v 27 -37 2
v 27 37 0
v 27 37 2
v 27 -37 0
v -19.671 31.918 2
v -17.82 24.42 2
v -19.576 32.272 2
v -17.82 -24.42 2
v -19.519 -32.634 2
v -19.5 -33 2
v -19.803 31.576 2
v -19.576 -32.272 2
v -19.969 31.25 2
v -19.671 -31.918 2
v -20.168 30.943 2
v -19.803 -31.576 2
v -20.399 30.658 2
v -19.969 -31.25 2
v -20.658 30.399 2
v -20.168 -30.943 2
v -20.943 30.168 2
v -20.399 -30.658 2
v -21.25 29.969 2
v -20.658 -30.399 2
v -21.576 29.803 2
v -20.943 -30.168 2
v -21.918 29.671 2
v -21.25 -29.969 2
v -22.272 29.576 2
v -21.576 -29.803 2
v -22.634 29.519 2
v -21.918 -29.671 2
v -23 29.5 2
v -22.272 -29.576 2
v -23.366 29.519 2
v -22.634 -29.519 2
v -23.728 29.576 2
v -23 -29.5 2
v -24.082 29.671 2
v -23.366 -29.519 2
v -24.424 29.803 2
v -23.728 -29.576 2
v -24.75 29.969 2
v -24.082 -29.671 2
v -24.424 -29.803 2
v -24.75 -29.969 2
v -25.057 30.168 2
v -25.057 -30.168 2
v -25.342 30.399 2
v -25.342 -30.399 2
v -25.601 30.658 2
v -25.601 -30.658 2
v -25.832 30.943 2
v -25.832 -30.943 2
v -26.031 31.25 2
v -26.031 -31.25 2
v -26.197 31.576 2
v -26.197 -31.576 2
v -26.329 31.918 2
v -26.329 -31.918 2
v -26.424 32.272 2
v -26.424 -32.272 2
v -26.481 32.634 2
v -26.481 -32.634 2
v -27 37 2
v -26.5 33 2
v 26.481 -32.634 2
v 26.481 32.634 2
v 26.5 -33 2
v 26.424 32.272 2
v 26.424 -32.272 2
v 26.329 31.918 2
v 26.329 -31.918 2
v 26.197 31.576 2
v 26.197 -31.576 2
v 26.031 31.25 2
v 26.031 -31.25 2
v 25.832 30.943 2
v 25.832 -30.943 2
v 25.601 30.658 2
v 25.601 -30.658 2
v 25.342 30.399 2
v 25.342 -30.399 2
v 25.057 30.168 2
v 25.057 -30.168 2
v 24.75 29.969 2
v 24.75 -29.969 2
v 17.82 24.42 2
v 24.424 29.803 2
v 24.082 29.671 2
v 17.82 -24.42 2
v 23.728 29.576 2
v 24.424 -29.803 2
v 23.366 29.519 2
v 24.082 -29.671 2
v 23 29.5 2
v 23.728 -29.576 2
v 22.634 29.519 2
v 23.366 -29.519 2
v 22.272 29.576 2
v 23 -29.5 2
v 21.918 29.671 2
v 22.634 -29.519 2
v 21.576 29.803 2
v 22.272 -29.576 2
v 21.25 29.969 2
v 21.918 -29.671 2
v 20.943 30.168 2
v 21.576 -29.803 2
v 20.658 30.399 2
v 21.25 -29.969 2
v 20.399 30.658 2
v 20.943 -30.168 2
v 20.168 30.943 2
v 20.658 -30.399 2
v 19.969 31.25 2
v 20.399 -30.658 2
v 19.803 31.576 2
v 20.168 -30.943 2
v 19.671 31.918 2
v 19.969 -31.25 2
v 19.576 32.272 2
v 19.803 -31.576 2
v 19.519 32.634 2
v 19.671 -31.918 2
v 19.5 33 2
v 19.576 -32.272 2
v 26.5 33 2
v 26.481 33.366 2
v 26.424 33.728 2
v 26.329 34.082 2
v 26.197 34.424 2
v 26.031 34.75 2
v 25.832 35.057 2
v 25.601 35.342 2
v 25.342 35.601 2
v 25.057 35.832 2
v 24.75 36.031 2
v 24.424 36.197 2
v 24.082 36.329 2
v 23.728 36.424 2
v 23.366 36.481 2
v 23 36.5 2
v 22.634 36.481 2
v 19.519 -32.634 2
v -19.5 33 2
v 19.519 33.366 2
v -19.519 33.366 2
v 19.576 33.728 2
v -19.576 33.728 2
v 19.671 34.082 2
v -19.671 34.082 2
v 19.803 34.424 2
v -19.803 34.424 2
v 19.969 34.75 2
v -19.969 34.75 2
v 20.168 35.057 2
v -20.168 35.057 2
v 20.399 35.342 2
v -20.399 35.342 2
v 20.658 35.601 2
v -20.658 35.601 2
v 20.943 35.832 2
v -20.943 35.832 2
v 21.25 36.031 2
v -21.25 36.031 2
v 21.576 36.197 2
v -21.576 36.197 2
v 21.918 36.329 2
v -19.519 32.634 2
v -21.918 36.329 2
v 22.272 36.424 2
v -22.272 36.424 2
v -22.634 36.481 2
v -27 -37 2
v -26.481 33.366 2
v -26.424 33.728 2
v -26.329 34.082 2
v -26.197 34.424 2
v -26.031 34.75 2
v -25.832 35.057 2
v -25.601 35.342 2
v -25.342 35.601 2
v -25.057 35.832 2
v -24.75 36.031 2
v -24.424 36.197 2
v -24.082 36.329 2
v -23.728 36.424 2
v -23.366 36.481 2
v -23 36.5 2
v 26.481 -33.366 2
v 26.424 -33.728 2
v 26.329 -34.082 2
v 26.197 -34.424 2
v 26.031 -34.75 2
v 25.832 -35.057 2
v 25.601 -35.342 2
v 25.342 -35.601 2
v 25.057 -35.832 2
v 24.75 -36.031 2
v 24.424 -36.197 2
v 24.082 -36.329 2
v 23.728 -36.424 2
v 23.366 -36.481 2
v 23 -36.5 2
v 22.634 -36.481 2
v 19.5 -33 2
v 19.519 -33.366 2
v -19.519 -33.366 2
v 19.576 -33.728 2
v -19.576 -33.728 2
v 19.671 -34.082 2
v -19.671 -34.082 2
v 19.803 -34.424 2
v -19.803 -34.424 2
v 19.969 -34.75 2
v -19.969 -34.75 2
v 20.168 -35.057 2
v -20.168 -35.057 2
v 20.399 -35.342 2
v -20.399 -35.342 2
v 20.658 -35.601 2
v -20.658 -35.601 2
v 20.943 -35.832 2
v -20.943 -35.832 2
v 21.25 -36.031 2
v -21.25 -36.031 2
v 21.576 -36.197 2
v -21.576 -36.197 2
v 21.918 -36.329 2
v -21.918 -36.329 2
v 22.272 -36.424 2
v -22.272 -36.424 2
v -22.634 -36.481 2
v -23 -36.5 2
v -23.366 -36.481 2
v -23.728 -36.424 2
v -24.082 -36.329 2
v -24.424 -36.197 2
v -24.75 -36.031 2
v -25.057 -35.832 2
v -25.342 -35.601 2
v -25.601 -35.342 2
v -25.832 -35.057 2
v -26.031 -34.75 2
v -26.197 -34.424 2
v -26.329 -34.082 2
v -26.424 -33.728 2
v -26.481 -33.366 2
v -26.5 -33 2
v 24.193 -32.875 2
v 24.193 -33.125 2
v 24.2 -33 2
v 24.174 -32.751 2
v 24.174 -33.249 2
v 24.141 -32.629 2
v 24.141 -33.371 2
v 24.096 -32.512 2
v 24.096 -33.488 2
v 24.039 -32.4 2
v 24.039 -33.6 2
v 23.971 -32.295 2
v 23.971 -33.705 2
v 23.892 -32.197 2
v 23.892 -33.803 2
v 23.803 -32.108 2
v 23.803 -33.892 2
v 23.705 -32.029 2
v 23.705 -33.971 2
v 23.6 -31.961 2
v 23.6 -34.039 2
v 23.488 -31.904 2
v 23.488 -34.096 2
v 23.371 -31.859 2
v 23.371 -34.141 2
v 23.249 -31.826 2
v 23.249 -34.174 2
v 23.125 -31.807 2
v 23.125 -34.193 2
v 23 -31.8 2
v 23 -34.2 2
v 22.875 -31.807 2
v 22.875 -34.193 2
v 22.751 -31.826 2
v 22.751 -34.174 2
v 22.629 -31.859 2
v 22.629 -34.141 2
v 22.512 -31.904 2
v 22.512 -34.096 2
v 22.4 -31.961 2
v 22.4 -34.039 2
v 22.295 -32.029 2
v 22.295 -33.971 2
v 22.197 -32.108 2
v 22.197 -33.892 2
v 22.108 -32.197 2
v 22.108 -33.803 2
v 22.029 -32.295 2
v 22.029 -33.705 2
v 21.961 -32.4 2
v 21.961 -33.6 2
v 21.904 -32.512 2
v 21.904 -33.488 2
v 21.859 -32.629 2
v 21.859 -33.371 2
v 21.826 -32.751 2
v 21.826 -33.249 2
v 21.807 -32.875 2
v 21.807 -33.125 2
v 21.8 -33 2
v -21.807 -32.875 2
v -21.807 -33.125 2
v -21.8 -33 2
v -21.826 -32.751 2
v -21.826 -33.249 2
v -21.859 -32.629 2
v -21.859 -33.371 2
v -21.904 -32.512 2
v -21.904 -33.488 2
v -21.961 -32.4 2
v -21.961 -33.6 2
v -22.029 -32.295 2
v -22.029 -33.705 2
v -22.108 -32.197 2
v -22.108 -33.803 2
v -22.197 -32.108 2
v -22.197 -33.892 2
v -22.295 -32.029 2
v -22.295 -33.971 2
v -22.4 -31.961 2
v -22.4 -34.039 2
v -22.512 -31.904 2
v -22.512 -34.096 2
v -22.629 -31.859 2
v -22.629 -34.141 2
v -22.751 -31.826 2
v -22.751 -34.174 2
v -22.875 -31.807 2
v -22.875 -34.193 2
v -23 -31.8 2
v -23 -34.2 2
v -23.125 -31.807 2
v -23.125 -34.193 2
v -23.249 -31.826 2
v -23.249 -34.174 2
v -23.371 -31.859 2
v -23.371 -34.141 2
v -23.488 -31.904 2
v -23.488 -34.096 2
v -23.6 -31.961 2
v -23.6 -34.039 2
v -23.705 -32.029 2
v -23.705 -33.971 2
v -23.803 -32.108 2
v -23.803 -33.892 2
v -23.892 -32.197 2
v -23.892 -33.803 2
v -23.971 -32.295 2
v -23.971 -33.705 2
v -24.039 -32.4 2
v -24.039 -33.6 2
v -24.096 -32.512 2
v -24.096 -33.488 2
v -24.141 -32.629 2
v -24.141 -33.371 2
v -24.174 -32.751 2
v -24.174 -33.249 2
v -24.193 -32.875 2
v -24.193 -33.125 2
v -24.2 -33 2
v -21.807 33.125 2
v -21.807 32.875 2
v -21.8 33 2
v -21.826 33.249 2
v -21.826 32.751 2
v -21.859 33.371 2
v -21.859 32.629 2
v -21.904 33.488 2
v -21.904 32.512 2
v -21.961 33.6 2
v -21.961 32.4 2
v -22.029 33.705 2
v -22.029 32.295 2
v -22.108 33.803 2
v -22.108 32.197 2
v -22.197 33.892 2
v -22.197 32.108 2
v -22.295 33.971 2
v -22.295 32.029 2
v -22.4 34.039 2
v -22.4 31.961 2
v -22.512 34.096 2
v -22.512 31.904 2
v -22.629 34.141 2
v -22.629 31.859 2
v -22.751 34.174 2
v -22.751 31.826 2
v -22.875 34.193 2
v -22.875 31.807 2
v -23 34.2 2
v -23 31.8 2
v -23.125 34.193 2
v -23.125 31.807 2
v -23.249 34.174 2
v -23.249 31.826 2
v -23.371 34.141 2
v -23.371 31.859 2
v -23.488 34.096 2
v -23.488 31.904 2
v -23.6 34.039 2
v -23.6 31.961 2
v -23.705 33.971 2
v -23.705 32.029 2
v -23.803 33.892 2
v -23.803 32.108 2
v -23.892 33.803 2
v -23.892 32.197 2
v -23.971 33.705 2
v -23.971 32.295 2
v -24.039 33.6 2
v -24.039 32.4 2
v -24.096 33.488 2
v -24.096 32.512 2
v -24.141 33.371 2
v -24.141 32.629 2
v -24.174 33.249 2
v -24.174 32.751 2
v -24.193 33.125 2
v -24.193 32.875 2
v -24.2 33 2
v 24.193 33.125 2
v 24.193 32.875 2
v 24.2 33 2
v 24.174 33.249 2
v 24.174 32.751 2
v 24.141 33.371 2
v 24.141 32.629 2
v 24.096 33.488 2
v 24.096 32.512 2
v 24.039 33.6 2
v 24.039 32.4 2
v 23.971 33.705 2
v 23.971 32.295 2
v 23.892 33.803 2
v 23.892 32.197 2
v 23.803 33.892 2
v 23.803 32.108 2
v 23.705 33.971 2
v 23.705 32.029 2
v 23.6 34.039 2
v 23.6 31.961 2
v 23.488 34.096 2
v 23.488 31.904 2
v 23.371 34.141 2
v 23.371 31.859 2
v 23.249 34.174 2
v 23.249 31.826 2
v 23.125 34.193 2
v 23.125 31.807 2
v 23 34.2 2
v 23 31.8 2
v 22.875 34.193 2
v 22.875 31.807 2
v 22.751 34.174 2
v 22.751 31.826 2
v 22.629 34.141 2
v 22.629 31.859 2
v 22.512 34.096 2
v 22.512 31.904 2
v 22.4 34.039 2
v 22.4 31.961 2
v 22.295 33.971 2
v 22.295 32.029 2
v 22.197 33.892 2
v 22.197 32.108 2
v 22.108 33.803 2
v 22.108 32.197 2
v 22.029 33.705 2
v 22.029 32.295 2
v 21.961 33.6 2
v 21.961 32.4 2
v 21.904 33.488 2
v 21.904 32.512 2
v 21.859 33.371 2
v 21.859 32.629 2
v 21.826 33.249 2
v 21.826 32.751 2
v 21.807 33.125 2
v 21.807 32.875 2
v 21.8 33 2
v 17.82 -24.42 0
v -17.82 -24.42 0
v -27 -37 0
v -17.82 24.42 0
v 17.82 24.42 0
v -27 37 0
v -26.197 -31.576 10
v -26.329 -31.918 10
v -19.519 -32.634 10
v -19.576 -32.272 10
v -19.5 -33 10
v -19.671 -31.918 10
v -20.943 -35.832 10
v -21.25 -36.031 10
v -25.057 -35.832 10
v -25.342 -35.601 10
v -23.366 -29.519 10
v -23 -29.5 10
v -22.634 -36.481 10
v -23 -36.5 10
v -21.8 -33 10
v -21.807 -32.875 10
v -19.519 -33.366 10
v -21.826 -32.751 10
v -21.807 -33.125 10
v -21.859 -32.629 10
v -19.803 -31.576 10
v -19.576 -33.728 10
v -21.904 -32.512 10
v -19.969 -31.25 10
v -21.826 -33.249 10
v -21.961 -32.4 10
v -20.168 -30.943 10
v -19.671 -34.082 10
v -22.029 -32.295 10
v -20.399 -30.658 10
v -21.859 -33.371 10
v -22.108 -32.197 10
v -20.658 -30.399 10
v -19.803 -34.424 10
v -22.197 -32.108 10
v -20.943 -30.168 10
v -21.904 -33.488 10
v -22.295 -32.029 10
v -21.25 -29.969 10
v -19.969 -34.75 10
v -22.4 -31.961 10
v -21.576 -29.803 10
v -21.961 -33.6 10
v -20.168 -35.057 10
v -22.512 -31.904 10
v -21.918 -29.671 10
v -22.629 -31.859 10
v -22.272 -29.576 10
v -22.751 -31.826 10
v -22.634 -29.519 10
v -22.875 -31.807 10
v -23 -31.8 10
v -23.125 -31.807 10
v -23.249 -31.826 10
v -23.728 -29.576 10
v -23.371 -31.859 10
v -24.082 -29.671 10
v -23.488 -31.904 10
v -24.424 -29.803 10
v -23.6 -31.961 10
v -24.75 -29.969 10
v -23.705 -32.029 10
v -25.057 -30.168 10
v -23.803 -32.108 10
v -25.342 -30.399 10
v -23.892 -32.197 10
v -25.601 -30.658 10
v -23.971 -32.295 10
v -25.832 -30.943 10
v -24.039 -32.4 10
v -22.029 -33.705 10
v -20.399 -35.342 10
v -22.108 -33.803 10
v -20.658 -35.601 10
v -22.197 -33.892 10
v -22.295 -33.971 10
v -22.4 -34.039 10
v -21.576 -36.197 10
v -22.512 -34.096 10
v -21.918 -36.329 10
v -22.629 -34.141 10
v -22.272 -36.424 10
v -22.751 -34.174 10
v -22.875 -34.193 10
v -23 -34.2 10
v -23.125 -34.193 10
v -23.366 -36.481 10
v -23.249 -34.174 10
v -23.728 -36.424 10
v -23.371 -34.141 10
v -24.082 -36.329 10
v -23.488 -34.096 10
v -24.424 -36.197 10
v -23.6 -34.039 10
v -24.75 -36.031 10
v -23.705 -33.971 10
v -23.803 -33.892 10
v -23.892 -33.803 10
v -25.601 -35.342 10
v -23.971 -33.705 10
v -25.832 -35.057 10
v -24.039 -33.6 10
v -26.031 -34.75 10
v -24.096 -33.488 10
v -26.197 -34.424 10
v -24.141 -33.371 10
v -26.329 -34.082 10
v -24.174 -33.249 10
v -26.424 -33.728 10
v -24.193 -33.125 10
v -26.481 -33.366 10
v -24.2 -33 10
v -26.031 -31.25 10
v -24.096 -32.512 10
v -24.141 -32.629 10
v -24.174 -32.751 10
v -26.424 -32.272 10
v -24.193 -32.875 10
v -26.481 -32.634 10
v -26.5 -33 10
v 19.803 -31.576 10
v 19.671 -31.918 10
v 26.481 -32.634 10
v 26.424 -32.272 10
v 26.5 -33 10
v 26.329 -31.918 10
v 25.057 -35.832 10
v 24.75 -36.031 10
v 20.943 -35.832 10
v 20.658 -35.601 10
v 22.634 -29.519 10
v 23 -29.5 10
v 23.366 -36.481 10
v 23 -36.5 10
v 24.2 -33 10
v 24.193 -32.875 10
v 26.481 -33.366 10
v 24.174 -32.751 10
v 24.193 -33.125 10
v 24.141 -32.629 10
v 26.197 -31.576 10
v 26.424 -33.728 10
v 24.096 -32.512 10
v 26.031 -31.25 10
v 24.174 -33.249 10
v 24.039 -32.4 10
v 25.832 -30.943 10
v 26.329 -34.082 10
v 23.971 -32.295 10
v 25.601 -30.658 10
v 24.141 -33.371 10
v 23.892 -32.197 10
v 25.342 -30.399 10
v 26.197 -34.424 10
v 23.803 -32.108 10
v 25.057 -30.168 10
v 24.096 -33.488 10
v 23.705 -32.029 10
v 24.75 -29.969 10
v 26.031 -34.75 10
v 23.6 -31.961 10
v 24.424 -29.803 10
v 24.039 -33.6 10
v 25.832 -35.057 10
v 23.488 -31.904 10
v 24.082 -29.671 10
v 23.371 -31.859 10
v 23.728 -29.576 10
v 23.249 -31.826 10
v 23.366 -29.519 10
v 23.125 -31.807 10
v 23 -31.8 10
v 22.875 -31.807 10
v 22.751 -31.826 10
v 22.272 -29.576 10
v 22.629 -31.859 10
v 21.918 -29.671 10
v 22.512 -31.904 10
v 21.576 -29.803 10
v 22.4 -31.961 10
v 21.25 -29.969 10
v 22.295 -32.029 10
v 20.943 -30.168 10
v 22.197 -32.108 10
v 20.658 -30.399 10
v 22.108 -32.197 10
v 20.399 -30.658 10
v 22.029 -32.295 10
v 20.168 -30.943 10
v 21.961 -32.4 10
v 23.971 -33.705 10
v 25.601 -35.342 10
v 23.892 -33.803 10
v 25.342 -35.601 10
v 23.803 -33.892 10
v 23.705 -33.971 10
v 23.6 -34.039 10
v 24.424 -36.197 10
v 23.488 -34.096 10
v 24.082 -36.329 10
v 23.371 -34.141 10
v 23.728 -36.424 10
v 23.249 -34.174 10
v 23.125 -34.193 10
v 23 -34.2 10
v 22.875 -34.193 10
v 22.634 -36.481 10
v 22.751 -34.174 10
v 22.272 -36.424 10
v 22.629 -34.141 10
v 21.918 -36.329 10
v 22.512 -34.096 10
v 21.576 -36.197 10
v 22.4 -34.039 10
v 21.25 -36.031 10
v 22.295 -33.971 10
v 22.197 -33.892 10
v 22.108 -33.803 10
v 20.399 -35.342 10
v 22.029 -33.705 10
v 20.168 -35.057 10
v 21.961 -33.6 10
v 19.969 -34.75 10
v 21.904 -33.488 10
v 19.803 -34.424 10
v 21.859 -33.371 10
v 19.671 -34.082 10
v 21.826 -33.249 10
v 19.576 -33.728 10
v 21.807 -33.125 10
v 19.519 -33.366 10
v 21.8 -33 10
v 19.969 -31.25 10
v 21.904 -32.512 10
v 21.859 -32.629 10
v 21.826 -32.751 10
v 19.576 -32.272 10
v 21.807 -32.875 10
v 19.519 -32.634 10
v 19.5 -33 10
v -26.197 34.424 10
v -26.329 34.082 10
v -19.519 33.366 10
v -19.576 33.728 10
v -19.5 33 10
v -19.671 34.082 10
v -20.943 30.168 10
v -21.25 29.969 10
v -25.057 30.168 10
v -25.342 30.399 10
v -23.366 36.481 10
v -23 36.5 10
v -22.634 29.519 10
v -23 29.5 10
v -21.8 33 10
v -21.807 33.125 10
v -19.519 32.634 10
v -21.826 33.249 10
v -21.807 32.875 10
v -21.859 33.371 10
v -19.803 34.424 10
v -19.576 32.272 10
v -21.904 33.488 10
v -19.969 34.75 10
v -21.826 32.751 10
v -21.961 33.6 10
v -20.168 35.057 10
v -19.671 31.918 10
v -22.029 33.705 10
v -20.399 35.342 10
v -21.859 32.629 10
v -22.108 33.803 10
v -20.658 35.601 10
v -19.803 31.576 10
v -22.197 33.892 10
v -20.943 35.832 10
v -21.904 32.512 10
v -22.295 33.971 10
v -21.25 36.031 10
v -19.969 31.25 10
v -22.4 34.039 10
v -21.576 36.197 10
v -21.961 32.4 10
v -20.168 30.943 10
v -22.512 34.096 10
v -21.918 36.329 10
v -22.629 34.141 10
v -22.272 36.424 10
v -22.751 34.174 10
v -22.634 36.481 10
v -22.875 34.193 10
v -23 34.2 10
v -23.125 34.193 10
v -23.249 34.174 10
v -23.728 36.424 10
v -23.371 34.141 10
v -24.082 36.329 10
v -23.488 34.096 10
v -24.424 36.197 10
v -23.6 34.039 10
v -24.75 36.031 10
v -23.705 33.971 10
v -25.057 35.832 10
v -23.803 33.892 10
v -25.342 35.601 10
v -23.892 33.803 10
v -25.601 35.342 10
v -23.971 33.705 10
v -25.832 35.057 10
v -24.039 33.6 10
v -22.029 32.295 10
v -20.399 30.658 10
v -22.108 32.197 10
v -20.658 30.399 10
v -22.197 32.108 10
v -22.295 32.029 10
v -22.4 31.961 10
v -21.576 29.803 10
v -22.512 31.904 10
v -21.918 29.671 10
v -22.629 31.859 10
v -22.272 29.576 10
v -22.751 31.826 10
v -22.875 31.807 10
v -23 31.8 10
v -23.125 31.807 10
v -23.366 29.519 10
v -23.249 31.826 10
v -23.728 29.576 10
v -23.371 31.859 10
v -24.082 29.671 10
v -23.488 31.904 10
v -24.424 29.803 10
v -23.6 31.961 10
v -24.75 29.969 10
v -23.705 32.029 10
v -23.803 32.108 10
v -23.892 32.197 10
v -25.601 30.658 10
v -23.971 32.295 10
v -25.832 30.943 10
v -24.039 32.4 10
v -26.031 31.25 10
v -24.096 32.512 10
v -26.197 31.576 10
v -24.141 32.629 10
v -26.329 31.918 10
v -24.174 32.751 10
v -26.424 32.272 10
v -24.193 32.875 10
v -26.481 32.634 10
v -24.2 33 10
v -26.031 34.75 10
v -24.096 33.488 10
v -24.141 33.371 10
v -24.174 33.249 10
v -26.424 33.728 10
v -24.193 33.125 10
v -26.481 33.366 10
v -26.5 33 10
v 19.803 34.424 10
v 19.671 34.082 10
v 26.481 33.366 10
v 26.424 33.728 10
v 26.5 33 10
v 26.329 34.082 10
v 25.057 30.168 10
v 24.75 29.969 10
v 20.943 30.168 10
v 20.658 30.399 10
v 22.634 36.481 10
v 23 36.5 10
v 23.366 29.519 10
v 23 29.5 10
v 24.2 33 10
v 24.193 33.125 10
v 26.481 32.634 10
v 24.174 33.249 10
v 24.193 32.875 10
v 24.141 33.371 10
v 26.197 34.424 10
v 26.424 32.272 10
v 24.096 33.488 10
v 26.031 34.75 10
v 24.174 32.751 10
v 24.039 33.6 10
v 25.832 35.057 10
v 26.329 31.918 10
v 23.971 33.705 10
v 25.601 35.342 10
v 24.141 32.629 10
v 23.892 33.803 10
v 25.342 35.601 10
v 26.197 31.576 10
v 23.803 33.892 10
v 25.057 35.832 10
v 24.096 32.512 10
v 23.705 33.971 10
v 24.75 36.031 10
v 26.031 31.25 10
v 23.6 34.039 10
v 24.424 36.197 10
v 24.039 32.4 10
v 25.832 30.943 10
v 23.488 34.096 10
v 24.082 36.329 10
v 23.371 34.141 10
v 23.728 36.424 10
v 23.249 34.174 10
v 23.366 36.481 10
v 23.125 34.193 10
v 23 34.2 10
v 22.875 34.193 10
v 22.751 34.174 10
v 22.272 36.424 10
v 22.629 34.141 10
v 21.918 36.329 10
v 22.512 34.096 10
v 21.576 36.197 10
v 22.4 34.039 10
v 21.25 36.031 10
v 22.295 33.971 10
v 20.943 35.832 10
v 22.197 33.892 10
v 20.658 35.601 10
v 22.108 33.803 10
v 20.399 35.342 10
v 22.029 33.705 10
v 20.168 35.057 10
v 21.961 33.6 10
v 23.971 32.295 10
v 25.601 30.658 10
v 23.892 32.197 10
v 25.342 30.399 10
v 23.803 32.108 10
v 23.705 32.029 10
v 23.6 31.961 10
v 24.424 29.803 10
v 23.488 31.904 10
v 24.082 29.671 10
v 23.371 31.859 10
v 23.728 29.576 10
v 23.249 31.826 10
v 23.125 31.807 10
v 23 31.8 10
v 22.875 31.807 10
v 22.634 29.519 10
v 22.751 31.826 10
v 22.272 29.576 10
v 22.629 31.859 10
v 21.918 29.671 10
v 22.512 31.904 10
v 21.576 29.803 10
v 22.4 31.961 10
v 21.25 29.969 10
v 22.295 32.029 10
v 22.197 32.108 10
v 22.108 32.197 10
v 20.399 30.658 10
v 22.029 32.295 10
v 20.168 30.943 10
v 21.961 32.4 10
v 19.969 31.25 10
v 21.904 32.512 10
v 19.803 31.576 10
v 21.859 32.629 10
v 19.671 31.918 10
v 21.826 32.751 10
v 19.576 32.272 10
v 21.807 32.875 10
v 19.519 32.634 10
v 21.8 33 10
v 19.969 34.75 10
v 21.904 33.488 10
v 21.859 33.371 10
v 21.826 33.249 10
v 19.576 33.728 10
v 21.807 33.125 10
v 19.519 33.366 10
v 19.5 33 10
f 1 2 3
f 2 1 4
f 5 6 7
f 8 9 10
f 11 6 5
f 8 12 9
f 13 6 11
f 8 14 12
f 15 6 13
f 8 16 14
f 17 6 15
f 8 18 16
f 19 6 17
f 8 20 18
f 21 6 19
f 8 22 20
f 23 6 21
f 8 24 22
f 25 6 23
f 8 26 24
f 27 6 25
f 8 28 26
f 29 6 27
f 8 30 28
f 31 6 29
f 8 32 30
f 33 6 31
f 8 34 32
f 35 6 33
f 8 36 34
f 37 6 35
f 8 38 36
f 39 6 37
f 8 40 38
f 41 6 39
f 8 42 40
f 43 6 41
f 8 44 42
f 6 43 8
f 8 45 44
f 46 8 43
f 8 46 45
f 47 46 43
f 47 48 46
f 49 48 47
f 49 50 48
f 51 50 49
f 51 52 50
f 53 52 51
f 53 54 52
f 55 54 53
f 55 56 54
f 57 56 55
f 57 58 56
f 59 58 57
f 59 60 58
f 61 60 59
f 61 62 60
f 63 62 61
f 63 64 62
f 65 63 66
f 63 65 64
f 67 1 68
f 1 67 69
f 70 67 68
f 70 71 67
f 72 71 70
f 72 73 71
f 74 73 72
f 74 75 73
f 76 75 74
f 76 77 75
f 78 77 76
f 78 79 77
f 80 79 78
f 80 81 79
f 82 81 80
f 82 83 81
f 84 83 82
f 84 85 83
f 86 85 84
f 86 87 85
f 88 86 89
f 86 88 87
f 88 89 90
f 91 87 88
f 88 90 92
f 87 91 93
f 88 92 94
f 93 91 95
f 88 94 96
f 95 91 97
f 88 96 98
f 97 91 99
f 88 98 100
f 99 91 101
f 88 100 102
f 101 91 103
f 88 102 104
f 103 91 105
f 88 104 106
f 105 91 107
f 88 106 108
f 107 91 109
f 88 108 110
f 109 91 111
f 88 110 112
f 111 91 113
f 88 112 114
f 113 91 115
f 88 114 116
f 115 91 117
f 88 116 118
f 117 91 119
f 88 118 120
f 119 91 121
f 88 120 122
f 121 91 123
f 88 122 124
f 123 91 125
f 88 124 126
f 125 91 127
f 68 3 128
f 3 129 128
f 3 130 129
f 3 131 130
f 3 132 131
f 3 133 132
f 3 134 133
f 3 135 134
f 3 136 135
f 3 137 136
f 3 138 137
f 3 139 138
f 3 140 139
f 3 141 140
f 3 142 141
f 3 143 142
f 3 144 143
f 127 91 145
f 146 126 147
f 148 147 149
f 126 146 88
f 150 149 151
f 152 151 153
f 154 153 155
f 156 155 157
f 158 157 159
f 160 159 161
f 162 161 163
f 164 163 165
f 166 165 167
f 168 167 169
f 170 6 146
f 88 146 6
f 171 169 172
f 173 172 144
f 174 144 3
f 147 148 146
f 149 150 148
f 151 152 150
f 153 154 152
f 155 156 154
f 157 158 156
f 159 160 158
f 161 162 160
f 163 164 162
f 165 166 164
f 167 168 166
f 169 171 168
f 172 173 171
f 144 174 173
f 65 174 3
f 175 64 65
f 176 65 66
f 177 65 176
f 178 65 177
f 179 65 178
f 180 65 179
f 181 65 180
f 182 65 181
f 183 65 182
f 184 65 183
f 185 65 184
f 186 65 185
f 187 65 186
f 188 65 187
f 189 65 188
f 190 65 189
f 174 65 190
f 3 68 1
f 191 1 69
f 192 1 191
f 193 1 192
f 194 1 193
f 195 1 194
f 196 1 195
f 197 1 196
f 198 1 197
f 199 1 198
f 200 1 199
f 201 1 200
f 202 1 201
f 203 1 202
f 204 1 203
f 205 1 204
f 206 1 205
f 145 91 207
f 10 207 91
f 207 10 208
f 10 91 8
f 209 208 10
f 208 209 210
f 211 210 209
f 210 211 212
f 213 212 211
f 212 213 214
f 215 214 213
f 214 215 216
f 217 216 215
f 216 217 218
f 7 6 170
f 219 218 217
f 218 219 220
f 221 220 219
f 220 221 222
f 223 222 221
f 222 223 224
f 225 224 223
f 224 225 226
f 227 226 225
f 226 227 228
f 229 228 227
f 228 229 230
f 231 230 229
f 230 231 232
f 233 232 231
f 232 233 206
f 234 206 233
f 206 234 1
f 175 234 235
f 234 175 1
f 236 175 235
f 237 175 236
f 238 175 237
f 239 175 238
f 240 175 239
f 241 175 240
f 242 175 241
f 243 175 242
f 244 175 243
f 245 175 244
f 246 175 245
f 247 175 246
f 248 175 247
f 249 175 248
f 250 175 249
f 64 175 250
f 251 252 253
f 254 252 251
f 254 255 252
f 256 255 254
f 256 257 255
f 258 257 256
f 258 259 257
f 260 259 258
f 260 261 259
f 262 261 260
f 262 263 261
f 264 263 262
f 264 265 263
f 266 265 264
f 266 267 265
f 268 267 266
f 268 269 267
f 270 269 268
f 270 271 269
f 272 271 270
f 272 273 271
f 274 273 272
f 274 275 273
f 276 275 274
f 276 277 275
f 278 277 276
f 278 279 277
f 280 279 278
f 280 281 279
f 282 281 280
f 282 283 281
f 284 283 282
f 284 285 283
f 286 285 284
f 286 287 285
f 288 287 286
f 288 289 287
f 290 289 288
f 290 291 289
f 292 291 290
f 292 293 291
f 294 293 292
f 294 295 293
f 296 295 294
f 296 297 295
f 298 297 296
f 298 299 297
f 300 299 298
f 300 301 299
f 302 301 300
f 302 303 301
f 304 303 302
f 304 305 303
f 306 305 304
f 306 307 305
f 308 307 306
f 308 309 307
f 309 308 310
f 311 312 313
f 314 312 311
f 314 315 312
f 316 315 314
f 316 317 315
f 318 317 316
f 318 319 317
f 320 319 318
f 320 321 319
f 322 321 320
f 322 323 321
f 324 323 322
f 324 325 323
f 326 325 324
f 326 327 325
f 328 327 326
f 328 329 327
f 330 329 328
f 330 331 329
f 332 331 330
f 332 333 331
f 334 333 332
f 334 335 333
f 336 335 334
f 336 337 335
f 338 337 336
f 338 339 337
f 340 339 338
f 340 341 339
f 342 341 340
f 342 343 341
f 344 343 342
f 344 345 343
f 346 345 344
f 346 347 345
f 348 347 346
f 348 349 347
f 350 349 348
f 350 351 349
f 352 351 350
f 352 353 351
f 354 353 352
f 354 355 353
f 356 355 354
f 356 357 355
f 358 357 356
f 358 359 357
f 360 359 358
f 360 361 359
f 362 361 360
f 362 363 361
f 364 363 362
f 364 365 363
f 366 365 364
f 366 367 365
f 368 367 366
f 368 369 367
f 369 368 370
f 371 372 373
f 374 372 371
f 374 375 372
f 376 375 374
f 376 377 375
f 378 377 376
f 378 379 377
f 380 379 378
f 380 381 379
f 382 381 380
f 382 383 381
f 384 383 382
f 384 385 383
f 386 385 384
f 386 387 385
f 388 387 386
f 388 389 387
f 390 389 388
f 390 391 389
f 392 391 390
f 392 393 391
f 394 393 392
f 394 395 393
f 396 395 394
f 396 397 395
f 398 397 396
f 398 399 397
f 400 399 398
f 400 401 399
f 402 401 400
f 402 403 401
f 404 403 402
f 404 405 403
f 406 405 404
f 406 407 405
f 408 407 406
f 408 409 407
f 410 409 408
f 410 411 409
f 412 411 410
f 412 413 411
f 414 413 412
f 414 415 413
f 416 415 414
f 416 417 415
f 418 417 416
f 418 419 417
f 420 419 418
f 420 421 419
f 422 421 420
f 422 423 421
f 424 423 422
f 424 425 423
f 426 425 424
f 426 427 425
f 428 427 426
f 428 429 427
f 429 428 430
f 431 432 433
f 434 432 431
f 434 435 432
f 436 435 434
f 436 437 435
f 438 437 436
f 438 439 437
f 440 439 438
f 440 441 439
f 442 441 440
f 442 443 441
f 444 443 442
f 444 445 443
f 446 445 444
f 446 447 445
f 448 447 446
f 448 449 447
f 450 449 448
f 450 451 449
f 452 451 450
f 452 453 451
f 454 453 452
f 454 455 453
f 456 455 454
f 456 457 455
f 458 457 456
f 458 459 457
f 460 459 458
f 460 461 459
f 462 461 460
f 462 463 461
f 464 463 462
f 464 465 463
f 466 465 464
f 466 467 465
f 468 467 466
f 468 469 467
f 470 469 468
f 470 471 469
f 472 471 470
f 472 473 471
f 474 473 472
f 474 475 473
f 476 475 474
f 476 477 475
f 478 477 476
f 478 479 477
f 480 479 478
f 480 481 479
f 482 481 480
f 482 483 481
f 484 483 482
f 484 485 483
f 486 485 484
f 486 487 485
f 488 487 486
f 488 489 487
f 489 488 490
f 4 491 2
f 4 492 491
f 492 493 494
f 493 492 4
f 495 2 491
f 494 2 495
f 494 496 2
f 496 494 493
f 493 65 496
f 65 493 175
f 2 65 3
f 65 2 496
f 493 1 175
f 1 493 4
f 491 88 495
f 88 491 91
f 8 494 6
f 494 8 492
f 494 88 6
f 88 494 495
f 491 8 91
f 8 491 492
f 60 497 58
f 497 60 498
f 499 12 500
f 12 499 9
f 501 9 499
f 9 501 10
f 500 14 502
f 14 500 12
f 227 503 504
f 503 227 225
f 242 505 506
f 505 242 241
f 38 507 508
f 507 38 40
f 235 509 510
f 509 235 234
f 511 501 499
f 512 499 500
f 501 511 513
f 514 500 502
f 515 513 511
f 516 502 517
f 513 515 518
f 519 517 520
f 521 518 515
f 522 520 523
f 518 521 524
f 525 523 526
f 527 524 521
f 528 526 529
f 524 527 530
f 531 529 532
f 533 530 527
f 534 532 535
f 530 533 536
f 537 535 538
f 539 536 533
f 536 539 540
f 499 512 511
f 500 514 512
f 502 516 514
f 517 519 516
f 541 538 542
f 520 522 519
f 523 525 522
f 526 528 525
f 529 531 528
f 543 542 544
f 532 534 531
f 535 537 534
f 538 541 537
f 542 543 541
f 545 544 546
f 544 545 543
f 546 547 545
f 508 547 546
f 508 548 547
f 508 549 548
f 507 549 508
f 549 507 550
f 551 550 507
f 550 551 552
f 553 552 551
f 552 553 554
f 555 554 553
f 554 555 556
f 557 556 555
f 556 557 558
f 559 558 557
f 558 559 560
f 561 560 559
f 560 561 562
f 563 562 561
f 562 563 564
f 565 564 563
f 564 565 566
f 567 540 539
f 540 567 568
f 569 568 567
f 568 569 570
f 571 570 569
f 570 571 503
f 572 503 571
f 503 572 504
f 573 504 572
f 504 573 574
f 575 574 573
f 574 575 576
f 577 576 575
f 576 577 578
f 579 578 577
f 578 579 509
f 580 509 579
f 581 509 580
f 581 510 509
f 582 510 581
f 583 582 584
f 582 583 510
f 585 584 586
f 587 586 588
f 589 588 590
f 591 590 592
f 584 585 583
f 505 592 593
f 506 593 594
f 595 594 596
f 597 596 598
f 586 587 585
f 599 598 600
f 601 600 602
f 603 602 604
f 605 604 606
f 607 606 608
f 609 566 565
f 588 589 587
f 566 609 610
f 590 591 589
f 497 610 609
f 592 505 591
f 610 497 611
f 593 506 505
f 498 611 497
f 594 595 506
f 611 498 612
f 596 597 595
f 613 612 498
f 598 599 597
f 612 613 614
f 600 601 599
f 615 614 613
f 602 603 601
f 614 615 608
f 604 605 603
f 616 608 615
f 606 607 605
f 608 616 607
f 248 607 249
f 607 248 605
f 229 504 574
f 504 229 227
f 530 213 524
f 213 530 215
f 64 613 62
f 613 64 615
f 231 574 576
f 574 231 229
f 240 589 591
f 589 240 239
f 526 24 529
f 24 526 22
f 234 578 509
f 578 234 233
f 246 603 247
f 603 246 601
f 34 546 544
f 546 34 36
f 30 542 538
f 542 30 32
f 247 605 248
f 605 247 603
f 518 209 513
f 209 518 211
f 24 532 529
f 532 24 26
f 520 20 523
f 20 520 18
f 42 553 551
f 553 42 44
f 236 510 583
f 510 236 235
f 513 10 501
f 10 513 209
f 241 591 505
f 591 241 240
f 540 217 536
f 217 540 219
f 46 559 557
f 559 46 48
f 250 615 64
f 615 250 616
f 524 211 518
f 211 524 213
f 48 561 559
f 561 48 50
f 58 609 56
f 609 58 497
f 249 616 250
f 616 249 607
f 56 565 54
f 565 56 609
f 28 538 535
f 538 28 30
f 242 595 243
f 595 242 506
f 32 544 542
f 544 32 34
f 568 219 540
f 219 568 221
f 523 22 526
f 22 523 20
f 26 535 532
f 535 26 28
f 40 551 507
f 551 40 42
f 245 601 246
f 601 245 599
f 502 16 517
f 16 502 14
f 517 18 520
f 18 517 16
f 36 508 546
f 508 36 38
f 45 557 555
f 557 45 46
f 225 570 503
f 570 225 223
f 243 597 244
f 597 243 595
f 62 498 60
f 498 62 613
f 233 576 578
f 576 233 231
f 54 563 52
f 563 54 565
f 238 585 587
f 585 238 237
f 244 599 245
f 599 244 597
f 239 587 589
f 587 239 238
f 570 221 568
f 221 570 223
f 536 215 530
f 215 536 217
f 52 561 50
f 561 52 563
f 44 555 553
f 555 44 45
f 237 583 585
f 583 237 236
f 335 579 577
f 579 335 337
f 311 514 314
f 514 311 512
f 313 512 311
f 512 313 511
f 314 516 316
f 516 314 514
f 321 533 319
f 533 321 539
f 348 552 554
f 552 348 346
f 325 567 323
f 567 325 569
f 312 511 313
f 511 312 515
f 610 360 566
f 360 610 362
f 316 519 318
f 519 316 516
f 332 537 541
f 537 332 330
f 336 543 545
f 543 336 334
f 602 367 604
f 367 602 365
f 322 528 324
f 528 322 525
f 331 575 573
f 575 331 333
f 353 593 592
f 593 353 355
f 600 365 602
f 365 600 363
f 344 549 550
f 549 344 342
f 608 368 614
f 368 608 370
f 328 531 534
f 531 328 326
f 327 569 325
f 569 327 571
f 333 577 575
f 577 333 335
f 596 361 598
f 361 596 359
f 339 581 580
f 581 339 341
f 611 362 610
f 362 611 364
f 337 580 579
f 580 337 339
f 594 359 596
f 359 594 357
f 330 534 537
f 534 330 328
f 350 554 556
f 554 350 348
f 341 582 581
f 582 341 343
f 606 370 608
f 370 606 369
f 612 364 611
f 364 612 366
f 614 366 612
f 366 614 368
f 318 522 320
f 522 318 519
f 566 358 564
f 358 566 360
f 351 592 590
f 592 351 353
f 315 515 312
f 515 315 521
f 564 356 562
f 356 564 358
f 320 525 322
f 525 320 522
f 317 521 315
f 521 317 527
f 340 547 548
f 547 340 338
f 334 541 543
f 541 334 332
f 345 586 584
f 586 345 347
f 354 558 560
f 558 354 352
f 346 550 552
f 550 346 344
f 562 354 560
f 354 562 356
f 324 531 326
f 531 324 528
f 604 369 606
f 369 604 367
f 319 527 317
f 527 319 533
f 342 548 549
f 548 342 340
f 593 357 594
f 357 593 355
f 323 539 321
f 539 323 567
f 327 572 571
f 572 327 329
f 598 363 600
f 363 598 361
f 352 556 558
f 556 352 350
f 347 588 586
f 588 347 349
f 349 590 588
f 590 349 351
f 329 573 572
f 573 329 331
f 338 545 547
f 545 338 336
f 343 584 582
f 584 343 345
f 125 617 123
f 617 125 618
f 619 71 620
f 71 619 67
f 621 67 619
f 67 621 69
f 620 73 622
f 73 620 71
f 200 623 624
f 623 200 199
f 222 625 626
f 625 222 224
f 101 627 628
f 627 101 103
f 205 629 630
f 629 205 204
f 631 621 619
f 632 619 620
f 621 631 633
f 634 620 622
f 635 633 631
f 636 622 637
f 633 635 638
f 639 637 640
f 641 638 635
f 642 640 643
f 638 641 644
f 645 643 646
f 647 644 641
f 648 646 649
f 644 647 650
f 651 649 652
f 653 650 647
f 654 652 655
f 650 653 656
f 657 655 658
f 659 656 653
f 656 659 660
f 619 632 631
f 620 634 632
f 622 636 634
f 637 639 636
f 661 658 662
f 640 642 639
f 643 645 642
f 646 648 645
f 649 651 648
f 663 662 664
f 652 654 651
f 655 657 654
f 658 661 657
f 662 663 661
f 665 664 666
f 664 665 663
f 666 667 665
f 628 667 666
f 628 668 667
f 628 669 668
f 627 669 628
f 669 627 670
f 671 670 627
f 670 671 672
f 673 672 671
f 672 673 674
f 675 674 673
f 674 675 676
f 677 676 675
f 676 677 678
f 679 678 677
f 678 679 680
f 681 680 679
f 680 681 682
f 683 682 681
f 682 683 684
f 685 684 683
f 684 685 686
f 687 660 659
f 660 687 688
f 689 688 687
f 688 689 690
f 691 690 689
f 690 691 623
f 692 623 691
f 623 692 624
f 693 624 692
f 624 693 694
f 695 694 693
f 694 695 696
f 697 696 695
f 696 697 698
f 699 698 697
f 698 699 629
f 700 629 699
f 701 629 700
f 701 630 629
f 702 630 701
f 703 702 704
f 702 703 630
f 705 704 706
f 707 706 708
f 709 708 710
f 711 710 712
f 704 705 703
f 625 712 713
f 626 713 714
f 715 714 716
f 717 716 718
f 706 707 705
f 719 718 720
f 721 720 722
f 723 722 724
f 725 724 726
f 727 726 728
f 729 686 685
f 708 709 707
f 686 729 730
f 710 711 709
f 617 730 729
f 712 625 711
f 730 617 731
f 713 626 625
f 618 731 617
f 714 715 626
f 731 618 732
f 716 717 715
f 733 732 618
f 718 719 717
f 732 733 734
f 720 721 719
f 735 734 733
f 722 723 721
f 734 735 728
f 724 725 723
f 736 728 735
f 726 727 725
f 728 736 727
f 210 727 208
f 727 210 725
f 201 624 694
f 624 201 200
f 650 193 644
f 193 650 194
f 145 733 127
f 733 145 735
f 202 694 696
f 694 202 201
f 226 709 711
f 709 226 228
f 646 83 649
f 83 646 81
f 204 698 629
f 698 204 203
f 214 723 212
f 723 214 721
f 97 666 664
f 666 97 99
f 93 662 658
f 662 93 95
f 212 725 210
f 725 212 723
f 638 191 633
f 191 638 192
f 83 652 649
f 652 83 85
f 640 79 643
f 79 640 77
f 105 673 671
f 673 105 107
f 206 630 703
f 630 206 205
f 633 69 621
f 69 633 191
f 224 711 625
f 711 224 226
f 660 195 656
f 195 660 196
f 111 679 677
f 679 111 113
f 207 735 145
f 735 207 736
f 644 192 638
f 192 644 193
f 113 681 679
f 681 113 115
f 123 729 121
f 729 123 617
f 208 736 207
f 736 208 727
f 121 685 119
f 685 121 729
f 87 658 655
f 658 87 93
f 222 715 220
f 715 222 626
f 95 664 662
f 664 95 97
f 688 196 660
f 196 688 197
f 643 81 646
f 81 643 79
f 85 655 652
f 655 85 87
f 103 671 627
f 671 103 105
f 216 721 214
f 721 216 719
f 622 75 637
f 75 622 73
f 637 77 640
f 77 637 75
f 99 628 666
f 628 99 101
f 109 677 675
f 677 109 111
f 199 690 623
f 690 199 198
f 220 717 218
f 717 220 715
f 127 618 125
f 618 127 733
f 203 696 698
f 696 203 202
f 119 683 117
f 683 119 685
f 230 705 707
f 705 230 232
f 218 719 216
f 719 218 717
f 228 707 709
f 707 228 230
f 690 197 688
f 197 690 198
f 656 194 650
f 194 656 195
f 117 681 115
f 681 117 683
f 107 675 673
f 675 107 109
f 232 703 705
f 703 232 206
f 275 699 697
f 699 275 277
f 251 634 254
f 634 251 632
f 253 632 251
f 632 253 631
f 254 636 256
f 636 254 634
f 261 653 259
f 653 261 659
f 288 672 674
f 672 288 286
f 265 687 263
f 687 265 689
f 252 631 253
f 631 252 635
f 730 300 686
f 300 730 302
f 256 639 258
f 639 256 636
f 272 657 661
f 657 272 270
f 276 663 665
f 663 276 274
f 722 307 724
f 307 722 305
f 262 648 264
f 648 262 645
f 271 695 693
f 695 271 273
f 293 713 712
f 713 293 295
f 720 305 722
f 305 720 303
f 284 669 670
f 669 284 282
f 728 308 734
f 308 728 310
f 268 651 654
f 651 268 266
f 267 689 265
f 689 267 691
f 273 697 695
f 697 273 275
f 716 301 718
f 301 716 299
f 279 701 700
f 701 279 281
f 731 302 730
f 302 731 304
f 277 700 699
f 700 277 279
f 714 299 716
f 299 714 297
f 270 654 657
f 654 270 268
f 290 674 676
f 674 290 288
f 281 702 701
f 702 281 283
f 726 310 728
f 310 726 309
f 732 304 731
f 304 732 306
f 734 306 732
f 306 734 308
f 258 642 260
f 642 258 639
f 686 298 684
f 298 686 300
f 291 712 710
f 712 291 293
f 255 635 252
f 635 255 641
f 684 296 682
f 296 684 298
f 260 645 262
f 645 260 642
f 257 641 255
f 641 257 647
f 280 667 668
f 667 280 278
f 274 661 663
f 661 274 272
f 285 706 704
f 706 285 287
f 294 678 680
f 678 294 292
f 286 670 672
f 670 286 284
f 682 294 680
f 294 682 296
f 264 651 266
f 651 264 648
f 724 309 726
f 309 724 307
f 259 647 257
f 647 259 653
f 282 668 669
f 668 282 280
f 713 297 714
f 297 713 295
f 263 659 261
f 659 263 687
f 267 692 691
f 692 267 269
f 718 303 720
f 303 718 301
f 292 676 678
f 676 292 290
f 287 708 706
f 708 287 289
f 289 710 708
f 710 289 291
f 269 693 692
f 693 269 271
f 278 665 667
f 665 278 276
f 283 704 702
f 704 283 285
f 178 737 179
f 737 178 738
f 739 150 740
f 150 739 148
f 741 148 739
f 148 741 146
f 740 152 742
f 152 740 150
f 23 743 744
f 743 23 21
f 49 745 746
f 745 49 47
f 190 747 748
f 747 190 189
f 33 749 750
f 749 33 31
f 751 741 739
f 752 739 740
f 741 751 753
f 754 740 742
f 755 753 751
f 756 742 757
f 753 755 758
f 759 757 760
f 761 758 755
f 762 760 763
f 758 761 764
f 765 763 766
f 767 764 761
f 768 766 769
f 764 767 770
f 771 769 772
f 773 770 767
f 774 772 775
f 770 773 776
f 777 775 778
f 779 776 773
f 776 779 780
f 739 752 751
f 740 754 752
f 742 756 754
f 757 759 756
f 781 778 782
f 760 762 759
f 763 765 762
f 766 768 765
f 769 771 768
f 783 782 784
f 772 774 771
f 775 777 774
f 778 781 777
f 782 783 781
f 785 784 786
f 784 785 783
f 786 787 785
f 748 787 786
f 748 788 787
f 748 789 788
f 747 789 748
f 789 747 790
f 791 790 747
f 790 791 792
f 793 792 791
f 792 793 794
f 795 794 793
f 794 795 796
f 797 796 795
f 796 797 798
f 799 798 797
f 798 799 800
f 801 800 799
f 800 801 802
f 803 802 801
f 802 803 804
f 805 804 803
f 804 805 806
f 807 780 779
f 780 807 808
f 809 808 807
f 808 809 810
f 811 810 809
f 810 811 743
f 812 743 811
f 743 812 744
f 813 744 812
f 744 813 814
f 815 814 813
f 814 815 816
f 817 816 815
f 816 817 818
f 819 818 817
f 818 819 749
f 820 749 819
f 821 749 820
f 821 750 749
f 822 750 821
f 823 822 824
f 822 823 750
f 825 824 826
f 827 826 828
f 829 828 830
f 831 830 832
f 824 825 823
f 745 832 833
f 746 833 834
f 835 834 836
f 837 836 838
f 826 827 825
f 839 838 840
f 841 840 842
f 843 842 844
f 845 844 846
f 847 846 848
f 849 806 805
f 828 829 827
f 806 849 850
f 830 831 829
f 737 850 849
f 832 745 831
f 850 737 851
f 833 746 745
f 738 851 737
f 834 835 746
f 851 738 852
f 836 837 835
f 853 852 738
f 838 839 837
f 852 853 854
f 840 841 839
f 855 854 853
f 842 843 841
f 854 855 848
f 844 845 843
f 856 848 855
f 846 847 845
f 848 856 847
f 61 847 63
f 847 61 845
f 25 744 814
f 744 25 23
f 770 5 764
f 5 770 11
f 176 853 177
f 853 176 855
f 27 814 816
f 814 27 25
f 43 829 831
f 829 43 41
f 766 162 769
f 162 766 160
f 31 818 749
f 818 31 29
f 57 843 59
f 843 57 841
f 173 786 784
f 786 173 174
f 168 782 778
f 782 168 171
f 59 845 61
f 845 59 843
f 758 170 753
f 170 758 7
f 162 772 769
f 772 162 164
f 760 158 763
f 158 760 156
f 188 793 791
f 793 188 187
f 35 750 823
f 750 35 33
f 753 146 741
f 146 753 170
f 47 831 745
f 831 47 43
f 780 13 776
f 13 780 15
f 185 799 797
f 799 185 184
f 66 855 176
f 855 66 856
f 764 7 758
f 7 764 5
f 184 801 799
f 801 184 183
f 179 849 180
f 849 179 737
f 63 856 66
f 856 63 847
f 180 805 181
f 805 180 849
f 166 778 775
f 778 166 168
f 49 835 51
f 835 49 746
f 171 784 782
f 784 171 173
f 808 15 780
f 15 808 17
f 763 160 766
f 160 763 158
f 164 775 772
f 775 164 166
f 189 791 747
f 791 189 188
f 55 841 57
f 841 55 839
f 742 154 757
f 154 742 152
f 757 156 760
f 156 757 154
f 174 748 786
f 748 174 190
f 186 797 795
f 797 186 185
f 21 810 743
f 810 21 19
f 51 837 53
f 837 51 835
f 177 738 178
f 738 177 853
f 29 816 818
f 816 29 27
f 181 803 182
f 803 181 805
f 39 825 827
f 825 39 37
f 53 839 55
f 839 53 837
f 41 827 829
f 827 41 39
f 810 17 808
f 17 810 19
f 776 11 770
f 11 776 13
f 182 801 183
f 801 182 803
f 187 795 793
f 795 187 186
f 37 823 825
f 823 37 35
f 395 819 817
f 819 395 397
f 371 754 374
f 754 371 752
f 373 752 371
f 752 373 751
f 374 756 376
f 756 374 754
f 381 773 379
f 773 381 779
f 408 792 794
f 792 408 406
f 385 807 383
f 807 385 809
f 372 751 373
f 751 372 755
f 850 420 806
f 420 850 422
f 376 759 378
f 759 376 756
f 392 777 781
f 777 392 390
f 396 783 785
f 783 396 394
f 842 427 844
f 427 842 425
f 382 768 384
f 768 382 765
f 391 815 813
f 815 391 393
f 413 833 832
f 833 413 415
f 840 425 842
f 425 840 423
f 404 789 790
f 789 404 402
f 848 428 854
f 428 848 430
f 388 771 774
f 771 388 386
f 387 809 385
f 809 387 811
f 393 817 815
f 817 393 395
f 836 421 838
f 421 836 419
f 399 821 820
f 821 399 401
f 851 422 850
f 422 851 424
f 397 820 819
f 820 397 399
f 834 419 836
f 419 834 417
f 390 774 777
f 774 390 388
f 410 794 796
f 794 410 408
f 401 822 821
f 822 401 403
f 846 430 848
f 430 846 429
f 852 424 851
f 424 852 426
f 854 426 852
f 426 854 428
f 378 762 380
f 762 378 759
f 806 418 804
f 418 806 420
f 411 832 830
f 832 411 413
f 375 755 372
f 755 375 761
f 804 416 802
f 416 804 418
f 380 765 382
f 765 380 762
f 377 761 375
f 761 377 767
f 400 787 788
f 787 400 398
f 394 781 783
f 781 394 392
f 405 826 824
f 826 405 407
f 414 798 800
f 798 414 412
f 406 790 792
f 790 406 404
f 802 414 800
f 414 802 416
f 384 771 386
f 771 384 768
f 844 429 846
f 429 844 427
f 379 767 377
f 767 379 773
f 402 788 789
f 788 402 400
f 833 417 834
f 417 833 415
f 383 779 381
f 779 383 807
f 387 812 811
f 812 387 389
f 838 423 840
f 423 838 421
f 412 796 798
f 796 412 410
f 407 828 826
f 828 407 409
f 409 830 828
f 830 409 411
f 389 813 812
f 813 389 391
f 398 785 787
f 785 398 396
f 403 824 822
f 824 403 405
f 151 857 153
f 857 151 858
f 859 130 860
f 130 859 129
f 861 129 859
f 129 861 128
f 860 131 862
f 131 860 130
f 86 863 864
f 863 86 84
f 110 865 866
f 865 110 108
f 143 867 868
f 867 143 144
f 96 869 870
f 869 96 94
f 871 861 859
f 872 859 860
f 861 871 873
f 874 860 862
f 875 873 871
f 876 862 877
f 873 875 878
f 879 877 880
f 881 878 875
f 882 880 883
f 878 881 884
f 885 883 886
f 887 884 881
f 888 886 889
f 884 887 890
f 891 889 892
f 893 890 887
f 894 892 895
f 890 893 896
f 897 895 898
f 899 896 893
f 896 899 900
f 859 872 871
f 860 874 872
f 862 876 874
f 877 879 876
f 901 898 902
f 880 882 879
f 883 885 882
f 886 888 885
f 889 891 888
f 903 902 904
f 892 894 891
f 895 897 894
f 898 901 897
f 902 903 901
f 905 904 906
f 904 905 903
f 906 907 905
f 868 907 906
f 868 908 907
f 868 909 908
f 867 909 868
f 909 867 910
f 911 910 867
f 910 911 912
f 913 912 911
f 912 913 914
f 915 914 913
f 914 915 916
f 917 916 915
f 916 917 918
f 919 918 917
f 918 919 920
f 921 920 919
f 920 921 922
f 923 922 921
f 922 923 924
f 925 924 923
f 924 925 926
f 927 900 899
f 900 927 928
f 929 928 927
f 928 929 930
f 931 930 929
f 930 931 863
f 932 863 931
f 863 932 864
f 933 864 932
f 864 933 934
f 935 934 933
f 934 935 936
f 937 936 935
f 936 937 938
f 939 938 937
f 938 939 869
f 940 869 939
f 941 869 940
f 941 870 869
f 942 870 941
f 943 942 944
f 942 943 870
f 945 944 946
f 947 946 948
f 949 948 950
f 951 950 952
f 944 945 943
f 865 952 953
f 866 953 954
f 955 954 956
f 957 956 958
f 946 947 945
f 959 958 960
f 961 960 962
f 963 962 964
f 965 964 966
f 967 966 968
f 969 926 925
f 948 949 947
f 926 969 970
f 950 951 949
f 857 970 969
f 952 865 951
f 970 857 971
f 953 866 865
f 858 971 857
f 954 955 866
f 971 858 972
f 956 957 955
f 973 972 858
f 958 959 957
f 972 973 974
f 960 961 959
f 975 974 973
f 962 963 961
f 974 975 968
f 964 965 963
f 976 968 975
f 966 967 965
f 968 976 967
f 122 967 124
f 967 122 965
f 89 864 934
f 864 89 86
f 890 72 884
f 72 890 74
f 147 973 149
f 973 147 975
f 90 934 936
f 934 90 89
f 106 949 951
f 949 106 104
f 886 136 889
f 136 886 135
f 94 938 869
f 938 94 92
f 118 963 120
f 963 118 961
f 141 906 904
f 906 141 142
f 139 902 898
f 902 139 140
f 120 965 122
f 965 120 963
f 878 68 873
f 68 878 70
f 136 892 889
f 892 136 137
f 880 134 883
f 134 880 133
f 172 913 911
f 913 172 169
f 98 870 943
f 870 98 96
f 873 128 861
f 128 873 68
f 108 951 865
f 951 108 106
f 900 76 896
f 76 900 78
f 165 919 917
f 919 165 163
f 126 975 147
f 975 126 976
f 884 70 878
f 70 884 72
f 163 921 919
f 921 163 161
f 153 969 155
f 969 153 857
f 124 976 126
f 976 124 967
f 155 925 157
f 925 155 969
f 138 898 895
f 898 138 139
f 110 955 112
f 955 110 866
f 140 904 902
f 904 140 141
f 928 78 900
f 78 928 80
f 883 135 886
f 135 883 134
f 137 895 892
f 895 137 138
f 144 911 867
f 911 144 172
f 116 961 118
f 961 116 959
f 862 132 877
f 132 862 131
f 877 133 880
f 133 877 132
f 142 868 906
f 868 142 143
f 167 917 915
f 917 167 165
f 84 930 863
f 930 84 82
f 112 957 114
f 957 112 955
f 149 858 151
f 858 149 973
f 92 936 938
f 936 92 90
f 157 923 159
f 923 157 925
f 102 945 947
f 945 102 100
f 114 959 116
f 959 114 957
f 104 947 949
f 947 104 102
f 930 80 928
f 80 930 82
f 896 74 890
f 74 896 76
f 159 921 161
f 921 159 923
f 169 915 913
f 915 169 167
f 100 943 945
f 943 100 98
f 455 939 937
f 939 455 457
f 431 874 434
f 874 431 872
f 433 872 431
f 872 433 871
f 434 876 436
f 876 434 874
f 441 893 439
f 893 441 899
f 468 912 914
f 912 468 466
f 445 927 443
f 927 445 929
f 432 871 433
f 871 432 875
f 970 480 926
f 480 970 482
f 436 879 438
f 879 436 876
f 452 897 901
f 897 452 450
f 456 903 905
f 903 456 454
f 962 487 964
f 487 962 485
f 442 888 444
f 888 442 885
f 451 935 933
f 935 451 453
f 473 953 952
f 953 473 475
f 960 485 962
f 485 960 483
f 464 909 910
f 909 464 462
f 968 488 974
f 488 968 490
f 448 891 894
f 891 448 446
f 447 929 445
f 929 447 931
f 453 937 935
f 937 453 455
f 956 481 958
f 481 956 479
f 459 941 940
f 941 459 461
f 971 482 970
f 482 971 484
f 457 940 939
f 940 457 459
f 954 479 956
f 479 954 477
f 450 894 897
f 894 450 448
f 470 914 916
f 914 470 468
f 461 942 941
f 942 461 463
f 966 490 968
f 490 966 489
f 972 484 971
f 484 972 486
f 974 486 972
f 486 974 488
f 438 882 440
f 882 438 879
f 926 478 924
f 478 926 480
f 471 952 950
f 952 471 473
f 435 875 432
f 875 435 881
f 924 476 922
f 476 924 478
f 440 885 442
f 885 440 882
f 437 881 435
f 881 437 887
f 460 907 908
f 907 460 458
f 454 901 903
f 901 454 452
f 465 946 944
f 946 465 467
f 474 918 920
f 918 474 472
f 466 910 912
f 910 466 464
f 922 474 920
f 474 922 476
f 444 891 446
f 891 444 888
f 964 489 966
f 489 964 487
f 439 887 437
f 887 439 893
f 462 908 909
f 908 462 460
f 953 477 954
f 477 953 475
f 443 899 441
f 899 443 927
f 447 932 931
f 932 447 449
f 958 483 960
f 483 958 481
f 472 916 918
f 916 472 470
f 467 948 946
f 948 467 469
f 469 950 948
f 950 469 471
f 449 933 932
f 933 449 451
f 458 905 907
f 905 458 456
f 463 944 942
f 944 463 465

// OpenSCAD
// Prototype board standoffs
//
//  by Jonathan Nobels, 2019
//
//  I dedicate any and all copyright interest in this software to the public domain.
//  I make this dedication for the benefit of the public at large and to the
//  detriment of my heirs and successors. I intend this dedication to be an overt
//  act of relinquishment in perpetuity of all present and future rights to this
//  software under copyright law. See <http://unlicense.org> for more info.
//

//Large Proto Board
SO_W=46;
SO_L=66;

//Small Proto Board
//SO_W=16;
//SO_L=76;

//4 Relay Board
//SO_W=48;
//SO_L=69;

W = SO_W+8;
L = SO_L+8;
H = 2;

SO_OD = 7;
SO_ID = 2.4;
SO_H = 10;
CO_RATIO = .66;

$fn=60;

base();

translate([-SO_W/2, -SO_L/2,0]) 
standoff();

translate([SO_W/2, -SO_L/2,0]) 
standoff();

translate([-SO_W/2, SO_L/2,0]) 
standoff();

translate([SO_W/2, SO_L/2,0]) 
standoff();


module base() {
   {
    difference() {
      translate([-W/2, -L/2,0])
      cube([W,L,H]);
      cube([W*CO_RATIO,L*CO_RATIO,H*2],center=true);
    }
  }
}
  
module standoff()
{
  difference() {
   cylinder(r=SO_OD/2, h=SO_H); 
   cylinder(r=SO_ID/2, h=SO_H*2); 
  } 
}
